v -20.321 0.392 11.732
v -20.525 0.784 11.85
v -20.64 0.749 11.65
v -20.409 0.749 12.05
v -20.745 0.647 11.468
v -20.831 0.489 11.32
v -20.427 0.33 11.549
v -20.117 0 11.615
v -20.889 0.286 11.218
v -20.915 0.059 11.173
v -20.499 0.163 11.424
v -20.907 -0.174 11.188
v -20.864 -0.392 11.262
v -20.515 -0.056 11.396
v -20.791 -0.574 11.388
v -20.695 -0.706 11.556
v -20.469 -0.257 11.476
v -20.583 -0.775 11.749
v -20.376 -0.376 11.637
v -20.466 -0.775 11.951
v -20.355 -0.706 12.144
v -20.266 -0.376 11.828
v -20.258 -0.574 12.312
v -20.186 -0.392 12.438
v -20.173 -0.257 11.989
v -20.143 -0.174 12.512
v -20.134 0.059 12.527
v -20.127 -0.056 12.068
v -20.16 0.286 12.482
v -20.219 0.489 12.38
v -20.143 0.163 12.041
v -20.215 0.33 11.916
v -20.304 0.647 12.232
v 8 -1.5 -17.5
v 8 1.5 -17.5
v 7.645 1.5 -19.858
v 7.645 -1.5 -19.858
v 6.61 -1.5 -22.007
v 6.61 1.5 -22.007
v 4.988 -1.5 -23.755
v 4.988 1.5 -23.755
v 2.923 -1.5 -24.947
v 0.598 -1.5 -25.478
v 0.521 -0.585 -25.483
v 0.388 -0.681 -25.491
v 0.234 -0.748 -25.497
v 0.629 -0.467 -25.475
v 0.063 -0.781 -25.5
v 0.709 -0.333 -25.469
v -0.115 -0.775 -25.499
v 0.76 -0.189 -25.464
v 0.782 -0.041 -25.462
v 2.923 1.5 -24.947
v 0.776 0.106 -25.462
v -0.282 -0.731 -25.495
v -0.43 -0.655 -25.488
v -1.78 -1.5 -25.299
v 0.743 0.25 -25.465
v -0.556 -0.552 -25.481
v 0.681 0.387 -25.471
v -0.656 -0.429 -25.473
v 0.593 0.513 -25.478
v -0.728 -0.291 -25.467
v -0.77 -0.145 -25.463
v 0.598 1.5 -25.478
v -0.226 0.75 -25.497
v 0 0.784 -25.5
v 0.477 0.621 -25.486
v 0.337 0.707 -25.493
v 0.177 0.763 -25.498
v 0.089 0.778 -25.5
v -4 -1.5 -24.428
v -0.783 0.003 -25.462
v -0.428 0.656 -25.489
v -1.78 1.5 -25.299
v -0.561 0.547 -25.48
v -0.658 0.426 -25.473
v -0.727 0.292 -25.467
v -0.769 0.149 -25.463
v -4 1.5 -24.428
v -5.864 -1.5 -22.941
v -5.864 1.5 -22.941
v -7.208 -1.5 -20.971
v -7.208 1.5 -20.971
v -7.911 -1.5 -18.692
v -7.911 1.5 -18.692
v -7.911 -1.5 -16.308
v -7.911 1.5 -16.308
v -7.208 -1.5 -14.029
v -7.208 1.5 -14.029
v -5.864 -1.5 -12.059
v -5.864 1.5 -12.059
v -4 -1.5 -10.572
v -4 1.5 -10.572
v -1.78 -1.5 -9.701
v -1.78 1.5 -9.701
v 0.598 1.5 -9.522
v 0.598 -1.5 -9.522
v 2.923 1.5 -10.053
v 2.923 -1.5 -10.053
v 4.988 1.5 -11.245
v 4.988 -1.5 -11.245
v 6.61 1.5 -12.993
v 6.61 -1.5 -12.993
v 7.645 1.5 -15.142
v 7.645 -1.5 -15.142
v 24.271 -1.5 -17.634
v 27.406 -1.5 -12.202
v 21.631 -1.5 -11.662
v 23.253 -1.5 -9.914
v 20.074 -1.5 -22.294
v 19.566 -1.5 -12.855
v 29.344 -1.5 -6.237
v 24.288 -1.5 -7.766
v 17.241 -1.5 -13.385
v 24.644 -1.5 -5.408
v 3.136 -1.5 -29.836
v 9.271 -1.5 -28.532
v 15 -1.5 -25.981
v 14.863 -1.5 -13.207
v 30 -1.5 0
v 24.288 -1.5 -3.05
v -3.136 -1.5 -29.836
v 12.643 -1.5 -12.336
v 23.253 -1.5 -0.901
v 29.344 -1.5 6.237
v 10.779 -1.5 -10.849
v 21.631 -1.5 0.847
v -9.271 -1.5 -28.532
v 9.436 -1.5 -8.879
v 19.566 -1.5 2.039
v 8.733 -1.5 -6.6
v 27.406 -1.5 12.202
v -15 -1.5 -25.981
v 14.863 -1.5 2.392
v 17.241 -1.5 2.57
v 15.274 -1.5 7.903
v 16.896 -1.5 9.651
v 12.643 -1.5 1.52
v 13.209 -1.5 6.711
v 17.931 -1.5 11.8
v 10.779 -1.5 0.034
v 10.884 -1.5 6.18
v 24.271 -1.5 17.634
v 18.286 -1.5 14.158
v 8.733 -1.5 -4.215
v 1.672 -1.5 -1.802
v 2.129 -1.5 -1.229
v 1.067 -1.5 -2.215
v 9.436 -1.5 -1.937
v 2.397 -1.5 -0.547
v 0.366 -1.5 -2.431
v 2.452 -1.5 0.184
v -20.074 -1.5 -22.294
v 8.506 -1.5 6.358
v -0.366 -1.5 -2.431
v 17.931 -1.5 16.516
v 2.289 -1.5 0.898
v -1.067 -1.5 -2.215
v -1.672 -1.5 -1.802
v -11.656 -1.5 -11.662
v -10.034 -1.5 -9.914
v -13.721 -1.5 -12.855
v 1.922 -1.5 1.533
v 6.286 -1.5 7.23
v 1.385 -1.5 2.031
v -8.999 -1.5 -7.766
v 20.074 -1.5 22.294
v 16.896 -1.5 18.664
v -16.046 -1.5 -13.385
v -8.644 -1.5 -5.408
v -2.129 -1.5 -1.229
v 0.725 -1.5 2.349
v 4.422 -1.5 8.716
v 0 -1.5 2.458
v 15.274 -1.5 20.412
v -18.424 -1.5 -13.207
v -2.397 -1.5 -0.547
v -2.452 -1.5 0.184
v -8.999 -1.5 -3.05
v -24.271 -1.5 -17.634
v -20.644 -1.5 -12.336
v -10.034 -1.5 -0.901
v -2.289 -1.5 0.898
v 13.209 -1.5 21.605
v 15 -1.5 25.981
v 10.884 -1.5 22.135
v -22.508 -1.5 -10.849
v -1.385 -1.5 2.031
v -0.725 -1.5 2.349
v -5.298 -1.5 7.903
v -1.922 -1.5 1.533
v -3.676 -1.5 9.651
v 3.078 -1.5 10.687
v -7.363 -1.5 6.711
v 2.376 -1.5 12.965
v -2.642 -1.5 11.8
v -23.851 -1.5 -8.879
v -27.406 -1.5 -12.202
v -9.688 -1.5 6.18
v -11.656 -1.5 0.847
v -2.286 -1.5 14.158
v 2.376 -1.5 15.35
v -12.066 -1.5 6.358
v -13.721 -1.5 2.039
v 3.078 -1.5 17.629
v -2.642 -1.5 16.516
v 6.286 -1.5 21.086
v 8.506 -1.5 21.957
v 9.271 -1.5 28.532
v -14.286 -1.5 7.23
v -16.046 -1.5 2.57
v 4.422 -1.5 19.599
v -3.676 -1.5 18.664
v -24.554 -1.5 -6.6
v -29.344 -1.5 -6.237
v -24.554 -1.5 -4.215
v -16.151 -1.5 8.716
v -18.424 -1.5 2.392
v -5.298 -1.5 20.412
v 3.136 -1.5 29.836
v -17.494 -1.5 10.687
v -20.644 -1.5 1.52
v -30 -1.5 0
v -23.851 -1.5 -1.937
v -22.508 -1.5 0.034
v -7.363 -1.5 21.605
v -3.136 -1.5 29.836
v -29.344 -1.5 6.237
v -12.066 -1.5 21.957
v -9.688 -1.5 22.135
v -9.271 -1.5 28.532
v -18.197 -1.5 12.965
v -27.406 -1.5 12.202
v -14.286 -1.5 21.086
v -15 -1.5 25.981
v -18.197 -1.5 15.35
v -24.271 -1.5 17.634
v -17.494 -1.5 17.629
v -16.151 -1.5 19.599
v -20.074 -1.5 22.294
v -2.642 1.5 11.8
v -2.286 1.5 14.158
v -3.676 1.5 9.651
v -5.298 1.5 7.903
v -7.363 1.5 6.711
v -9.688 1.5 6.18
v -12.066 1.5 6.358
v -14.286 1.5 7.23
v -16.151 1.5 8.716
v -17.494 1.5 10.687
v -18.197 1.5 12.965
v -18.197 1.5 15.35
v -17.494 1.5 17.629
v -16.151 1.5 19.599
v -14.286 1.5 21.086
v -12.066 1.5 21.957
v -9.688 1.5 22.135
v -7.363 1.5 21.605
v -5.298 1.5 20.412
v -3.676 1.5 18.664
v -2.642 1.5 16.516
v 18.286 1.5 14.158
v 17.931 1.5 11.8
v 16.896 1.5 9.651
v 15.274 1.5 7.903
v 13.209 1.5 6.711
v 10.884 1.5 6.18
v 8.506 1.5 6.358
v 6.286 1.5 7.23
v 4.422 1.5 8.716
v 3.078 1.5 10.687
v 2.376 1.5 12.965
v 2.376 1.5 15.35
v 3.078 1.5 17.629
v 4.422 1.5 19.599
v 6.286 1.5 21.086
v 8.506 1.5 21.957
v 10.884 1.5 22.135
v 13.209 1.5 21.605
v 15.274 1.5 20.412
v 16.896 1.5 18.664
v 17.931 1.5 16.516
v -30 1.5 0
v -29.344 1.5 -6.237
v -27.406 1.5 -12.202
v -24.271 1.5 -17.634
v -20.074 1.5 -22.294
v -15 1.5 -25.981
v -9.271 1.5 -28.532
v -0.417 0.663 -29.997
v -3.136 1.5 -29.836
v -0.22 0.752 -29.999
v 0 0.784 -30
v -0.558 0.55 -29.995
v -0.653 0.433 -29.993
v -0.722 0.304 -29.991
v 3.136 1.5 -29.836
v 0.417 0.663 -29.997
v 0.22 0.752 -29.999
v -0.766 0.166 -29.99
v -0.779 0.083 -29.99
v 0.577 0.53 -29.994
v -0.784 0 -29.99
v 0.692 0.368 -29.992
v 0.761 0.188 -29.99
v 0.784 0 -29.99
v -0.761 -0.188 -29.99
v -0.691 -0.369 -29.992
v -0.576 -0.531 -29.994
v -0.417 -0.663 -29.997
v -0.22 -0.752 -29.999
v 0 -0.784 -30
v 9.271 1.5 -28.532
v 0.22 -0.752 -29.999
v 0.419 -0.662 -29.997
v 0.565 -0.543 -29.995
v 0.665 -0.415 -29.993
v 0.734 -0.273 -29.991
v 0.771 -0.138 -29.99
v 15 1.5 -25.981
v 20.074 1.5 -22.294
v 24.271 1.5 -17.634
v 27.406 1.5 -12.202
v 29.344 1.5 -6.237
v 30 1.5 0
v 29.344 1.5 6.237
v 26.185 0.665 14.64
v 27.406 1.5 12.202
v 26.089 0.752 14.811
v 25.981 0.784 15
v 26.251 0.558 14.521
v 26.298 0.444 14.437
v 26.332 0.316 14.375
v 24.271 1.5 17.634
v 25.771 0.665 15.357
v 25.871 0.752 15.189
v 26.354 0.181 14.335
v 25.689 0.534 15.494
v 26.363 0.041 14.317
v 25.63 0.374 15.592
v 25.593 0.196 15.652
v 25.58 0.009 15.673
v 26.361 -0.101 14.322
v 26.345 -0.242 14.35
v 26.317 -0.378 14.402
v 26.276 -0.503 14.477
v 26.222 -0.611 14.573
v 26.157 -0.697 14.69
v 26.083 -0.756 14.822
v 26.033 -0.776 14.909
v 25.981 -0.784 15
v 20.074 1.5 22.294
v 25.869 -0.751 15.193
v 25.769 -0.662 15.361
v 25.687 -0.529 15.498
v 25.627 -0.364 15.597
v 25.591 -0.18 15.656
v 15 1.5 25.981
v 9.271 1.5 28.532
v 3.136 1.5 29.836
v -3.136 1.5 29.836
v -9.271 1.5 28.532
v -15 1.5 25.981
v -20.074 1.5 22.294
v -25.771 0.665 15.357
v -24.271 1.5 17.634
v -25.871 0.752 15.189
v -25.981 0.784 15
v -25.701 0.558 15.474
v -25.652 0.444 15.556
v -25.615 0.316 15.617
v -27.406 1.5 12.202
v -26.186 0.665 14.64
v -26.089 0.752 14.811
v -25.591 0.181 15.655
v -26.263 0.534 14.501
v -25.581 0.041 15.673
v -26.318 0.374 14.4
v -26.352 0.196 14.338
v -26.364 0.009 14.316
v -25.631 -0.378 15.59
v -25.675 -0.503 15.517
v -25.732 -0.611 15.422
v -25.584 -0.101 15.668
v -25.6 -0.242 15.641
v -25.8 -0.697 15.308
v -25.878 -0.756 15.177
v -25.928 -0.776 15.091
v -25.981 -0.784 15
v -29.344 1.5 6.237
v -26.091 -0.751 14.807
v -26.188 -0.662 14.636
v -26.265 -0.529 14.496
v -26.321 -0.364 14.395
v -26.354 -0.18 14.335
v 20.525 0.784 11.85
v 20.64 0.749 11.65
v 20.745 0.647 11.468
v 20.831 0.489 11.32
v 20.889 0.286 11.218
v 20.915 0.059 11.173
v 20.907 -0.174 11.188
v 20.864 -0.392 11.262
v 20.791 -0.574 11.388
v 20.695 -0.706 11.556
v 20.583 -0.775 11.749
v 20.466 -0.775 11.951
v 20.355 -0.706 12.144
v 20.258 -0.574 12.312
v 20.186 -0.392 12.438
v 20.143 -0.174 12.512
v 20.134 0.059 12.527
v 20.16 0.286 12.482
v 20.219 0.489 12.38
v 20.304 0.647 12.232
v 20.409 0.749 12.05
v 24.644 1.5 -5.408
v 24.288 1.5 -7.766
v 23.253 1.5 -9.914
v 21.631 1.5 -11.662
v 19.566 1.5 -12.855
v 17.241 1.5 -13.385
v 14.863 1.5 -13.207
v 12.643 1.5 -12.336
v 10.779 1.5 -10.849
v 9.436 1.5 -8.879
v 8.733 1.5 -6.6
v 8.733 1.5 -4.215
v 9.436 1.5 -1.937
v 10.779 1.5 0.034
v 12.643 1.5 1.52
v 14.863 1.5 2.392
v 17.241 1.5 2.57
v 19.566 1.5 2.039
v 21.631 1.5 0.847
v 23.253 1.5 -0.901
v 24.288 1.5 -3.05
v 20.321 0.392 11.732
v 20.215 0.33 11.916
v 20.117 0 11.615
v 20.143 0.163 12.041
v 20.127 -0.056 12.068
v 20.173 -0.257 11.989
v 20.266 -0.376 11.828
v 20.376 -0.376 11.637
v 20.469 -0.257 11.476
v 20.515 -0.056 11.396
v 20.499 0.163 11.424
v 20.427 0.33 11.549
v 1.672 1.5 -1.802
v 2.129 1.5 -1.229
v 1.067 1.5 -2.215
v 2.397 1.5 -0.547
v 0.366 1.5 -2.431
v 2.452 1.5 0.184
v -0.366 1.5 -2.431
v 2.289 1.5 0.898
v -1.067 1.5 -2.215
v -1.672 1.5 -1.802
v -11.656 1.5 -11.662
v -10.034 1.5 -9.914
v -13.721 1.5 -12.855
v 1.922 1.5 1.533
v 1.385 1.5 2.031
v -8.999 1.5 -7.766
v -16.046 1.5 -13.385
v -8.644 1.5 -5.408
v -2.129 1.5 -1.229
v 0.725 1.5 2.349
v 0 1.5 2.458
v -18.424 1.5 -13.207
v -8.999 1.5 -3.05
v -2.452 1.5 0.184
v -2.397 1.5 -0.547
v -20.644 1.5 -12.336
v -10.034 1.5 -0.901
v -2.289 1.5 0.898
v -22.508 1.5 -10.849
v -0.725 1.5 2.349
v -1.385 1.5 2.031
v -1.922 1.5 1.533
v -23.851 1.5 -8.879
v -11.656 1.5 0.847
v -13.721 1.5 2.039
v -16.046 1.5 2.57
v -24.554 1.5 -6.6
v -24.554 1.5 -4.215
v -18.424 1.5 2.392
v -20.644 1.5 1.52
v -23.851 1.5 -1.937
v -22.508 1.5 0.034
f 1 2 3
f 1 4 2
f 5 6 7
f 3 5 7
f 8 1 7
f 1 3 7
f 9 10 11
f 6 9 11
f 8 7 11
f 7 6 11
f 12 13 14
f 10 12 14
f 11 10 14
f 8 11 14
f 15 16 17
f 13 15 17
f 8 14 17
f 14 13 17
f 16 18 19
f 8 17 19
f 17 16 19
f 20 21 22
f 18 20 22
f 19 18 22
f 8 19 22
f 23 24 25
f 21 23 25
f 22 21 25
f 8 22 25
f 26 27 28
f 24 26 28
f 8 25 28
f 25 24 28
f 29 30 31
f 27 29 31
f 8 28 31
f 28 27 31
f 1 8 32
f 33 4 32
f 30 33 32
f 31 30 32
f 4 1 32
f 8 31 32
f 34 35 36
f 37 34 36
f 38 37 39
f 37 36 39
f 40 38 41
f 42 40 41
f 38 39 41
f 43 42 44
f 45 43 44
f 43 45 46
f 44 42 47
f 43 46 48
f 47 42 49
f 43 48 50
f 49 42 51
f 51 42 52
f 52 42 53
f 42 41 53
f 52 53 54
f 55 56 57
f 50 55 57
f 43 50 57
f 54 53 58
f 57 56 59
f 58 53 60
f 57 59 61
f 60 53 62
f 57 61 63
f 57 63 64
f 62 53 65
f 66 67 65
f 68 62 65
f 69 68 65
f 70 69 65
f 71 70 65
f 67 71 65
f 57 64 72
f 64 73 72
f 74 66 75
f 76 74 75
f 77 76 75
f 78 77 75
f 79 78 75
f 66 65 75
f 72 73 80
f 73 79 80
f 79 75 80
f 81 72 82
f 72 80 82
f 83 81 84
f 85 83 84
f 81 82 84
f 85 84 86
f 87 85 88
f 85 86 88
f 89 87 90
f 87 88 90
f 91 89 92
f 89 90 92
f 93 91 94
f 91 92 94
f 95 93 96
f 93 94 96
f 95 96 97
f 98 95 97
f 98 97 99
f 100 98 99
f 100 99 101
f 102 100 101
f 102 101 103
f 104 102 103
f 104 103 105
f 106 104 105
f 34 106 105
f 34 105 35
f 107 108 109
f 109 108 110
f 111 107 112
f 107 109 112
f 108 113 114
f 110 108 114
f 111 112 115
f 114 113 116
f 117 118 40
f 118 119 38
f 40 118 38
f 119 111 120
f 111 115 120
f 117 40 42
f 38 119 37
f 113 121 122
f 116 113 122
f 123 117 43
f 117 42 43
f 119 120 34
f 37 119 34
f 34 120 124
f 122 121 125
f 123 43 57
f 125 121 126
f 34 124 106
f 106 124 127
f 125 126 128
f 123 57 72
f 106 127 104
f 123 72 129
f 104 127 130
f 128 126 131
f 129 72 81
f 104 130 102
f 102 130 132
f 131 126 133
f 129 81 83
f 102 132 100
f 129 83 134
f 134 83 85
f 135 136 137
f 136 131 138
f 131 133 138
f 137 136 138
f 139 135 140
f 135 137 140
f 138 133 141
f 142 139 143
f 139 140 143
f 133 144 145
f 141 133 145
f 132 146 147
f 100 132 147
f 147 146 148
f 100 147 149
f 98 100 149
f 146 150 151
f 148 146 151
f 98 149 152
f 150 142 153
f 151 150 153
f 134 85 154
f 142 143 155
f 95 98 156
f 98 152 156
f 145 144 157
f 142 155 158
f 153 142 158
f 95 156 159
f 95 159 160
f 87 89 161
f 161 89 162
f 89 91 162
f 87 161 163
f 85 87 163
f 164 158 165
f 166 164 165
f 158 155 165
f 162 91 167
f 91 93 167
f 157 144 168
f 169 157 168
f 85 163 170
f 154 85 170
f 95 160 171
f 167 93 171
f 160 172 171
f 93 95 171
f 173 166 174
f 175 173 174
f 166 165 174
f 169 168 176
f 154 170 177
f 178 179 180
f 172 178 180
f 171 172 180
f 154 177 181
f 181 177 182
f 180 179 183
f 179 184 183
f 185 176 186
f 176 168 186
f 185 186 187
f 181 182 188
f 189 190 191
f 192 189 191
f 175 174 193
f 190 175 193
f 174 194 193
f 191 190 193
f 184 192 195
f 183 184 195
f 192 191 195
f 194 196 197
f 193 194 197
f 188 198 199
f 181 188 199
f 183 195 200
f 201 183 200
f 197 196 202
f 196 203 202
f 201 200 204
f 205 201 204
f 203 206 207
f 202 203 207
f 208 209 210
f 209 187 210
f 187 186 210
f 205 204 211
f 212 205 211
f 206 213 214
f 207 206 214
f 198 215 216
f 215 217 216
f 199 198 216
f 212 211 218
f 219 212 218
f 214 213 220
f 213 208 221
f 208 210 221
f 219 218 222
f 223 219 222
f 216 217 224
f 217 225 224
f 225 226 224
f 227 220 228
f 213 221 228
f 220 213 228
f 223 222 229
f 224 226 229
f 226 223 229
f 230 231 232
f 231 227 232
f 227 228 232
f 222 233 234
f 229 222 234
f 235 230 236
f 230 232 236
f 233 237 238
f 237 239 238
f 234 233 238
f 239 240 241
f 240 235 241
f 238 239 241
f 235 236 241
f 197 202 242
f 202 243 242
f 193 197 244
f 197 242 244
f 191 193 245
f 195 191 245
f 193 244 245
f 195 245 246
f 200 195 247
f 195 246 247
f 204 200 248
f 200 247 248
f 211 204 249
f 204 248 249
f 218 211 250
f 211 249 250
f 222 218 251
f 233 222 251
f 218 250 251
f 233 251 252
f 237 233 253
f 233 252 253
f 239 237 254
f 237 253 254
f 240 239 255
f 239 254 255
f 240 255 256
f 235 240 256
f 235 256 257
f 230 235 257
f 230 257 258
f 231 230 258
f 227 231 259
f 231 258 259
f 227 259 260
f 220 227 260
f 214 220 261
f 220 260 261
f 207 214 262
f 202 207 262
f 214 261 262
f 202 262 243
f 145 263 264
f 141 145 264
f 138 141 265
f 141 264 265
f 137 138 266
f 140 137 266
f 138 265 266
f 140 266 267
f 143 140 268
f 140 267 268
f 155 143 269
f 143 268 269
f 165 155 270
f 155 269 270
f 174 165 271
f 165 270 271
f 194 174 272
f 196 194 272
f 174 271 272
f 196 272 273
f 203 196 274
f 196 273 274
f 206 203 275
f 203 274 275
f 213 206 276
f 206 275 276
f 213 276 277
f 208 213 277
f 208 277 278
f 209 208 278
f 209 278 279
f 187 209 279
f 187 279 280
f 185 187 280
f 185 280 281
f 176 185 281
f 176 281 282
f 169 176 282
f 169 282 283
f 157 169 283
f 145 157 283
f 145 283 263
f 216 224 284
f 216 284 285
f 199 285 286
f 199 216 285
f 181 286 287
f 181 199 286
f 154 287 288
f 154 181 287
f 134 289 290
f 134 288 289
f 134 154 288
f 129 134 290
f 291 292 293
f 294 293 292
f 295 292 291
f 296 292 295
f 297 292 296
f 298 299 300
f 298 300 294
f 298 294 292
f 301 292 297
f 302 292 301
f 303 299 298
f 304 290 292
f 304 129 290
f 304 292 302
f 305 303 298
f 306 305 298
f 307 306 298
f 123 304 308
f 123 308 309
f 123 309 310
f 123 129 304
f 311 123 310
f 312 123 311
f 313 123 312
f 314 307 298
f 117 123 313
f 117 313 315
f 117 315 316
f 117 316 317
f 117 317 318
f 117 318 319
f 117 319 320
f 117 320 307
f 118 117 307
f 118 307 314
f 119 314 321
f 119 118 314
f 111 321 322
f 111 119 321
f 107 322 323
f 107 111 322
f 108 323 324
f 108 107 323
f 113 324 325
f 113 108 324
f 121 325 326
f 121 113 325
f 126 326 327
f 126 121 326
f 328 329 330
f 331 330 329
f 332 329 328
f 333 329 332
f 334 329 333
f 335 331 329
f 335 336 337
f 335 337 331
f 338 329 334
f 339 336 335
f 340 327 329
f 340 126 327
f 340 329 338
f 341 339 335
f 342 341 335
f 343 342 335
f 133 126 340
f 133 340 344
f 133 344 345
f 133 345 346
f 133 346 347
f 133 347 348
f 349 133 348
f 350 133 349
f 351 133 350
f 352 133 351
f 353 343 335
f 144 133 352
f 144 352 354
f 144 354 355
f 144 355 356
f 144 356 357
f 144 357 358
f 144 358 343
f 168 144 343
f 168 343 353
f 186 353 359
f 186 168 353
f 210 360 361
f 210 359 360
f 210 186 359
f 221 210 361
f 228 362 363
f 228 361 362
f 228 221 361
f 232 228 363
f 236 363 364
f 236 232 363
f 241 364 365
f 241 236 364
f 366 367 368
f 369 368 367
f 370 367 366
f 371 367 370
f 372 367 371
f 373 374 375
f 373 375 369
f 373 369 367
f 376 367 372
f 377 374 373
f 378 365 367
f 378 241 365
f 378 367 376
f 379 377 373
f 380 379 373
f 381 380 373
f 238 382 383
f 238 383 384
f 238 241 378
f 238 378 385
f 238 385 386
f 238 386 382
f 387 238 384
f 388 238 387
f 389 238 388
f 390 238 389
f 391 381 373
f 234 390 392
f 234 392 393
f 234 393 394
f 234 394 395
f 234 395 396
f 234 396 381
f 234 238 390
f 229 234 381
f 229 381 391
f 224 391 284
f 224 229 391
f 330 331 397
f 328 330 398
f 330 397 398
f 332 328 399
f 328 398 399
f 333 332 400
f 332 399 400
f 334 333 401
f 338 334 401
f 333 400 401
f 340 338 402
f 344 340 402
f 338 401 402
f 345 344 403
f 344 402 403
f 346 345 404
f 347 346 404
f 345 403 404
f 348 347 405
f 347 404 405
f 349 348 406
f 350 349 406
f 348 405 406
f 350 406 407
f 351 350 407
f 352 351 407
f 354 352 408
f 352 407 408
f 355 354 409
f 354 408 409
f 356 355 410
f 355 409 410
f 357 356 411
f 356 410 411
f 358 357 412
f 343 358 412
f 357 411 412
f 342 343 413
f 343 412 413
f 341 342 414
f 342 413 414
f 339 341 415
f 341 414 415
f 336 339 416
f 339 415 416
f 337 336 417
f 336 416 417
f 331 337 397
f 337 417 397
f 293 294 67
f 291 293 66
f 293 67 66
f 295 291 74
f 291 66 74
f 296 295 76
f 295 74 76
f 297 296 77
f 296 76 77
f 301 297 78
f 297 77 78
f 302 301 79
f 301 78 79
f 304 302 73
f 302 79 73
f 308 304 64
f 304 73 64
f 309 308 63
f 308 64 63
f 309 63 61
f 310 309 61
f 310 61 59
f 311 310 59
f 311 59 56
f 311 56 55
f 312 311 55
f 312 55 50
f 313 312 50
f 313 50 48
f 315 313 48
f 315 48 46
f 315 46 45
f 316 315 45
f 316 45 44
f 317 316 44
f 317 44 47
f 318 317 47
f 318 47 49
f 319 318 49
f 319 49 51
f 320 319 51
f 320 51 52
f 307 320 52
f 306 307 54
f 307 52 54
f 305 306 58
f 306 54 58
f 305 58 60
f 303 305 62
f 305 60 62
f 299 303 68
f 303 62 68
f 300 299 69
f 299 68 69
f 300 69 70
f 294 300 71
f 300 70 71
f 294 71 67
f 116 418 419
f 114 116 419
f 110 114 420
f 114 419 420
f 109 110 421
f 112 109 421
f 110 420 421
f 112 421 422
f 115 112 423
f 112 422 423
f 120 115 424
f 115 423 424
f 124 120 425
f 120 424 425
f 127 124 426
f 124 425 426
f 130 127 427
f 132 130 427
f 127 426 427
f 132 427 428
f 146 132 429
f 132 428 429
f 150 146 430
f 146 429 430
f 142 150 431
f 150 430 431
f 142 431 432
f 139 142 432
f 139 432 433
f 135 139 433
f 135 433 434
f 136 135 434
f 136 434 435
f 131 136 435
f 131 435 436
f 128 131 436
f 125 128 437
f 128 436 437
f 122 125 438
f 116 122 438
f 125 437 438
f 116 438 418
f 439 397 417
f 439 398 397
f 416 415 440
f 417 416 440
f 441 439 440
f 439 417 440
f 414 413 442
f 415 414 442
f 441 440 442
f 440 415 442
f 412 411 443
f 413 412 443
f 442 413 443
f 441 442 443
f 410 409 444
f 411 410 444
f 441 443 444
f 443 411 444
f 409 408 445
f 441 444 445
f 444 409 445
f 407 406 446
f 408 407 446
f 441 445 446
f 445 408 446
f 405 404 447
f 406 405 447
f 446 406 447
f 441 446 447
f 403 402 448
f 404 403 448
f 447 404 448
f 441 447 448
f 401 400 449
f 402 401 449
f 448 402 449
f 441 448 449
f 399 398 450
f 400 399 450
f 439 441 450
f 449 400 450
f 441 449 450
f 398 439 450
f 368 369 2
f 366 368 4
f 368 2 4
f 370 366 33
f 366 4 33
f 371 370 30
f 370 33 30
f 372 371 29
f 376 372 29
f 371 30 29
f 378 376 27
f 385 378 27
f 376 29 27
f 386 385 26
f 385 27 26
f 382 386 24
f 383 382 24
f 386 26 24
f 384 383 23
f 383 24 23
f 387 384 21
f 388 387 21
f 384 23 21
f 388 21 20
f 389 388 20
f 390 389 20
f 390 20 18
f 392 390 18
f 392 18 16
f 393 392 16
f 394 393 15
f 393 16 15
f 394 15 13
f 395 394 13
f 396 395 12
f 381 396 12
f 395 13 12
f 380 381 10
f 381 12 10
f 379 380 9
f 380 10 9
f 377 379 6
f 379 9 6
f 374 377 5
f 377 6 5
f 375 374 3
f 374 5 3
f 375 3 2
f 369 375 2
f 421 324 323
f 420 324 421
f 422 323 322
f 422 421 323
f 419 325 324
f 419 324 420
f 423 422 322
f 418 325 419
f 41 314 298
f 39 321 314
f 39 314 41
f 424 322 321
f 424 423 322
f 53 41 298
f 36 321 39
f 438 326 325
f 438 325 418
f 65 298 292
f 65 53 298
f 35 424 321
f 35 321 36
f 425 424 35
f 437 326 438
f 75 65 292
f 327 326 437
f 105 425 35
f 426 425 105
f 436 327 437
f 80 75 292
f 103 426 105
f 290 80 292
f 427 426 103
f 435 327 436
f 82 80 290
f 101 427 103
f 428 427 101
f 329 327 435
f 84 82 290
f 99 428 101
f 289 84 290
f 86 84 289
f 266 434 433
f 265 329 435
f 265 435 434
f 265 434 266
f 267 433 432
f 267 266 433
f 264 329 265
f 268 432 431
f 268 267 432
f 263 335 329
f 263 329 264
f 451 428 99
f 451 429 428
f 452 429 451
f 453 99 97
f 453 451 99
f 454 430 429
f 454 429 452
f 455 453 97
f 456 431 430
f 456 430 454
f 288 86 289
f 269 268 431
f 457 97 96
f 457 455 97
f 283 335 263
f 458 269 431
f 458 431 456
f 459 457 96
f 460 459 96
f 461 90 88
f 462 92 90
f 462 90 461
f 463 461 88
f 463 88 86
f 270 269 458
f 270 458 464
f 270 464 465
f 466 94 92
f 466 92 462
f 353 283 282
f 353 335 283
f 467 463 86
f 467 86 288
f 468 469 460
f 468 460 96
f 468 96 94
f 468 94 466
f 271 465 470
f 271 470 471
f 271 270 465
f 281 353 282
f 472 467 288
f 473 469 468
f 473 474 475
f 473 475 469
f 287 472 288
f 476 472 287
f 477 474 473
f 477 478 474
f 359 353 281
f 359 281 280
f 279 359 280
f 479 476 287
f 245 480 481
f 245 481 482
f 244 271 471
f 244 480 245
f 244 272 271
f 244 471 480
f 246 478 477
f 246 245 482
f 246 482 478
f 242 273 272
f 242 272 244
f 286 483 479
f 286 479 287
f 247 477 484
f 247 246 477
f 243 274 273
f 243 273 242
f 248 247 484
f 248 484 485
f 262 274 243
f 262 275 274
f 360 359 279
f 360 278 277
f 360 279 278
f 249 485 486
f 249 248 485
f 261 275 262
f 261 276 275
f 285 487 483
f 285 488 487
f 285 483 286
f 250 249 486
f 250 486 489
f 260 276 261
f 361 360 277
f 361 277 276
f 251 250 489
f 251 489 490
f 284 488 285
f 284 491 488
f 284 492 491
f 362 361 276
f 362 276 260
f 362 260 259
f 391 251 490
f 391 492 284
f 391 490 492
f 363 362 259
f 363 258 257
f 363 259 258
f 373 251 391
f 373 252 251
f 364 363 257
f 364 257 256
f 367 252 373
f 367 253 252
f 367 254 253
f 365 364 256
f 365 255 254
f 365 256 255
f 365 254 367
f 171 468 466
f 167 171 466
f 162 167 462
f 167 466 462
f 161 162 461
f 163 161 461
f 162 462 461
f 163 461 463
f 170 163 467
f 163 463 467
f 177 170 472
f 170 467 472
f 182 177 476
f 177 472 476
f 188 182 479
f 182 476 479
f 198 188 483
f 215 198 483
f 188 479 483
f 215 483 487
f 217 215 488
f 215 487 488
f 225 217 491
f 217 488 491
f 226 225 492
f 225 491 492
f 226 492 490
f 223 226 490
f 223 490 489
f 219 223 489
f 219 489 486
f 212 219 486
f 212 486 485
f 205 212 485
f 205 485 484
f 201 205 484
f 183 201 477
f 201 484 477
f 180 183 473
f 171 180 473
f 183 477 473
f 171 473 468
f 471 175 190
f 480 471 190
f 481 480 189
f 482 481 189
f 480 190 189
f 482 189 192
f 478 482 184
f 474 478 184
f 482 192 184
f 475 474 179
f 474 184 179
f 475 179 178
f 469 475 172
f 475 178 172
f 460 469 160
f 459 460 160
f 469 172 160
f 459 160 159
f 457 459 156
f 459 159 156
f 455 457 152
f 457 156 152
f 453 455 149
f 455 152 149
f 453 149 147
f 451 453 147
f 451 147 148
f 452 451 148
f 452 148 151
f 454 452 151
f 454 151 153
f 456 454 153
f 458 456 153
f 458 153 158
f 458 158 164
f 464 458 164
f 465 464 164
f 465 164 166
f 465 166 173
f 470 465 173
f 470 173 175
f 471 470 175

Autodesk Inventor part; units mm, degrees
ref_plane "YZ Plane" through (0, 0, 0) normal (1, 0, 0) x (0, 1, 0)
ref_plane "XZ Plane" through (0, 0, 0) normal (0, 1, 0) x (-1, 0, 0)
sketch "Skizze1" plane through (0, 0, 0) normal (0, 1, 0) x (-1, 0, 0)
  circle A0 centre (0, 0) radius 30
  dimension "d0" = 60
extrude "Extrusion1" add sketch "Skizze1" along normal mid plane 3
sketch "Skizze2" plane through (0, 1.5, 0) normal (0, 1, 0) x (1, 0, 0)
  line L0 (0, 43.5645) -> (0, -46.3445) construction
  circle A0 centre (0, 17.5) radius 8
  circle A1 centre (-16.6435, 5.4078) radius 8
  circle A2 centre (-10.2862, -14.1578) radius 8
  circle A3 centre (10.2862, -14.1578) radius 8
  circle A4 centre (16.6435, 5.4078) radius 8
  point P0 (0, 0)
  dimension "d3" = 16
  dimension "d4" = 17.5
  dimension "d7" = 360
extrude "Extrusion2" cut sketch "Skizze2" against normal through all
sketch "Skizze3" plane through (0, 1.5, 0) normal (0, 1, 0) x (1, 0, 0)
  point P0 (0, 0)
  point P1 (0, 0)
hole "Bohrung1" at (0, 1.5, 0) direction (0, -1, 0) diameter 4.917 end through all thread size "M6x1" class "6H" standard "ISO Metric profile"
ref_plane "Arbeitsebene1" through (0, 0, -30) normal (0, 0, 1) x (1, 0, 0)
sketch "Skizze4" plane through (0, 0, -30) normal (0, 0, 1) x (1, 0, 0)
  point P0 (0, 0)
  point P1 (0, 0)
hole "Bohrung2" at (0, 0, -30) direction (0, 0, 1) diameter 1.567 depth 6.3 tip angle 118 thread size "M2x0.4" class "6H" standard "ISO Metric profile"
pattern_circular "Runde Anordnung1" count 3 over 360 about axis through (0, -10, 0) along (0, 1, 0) of "Bohrung2"
properties part number "Ronde_Engine"
